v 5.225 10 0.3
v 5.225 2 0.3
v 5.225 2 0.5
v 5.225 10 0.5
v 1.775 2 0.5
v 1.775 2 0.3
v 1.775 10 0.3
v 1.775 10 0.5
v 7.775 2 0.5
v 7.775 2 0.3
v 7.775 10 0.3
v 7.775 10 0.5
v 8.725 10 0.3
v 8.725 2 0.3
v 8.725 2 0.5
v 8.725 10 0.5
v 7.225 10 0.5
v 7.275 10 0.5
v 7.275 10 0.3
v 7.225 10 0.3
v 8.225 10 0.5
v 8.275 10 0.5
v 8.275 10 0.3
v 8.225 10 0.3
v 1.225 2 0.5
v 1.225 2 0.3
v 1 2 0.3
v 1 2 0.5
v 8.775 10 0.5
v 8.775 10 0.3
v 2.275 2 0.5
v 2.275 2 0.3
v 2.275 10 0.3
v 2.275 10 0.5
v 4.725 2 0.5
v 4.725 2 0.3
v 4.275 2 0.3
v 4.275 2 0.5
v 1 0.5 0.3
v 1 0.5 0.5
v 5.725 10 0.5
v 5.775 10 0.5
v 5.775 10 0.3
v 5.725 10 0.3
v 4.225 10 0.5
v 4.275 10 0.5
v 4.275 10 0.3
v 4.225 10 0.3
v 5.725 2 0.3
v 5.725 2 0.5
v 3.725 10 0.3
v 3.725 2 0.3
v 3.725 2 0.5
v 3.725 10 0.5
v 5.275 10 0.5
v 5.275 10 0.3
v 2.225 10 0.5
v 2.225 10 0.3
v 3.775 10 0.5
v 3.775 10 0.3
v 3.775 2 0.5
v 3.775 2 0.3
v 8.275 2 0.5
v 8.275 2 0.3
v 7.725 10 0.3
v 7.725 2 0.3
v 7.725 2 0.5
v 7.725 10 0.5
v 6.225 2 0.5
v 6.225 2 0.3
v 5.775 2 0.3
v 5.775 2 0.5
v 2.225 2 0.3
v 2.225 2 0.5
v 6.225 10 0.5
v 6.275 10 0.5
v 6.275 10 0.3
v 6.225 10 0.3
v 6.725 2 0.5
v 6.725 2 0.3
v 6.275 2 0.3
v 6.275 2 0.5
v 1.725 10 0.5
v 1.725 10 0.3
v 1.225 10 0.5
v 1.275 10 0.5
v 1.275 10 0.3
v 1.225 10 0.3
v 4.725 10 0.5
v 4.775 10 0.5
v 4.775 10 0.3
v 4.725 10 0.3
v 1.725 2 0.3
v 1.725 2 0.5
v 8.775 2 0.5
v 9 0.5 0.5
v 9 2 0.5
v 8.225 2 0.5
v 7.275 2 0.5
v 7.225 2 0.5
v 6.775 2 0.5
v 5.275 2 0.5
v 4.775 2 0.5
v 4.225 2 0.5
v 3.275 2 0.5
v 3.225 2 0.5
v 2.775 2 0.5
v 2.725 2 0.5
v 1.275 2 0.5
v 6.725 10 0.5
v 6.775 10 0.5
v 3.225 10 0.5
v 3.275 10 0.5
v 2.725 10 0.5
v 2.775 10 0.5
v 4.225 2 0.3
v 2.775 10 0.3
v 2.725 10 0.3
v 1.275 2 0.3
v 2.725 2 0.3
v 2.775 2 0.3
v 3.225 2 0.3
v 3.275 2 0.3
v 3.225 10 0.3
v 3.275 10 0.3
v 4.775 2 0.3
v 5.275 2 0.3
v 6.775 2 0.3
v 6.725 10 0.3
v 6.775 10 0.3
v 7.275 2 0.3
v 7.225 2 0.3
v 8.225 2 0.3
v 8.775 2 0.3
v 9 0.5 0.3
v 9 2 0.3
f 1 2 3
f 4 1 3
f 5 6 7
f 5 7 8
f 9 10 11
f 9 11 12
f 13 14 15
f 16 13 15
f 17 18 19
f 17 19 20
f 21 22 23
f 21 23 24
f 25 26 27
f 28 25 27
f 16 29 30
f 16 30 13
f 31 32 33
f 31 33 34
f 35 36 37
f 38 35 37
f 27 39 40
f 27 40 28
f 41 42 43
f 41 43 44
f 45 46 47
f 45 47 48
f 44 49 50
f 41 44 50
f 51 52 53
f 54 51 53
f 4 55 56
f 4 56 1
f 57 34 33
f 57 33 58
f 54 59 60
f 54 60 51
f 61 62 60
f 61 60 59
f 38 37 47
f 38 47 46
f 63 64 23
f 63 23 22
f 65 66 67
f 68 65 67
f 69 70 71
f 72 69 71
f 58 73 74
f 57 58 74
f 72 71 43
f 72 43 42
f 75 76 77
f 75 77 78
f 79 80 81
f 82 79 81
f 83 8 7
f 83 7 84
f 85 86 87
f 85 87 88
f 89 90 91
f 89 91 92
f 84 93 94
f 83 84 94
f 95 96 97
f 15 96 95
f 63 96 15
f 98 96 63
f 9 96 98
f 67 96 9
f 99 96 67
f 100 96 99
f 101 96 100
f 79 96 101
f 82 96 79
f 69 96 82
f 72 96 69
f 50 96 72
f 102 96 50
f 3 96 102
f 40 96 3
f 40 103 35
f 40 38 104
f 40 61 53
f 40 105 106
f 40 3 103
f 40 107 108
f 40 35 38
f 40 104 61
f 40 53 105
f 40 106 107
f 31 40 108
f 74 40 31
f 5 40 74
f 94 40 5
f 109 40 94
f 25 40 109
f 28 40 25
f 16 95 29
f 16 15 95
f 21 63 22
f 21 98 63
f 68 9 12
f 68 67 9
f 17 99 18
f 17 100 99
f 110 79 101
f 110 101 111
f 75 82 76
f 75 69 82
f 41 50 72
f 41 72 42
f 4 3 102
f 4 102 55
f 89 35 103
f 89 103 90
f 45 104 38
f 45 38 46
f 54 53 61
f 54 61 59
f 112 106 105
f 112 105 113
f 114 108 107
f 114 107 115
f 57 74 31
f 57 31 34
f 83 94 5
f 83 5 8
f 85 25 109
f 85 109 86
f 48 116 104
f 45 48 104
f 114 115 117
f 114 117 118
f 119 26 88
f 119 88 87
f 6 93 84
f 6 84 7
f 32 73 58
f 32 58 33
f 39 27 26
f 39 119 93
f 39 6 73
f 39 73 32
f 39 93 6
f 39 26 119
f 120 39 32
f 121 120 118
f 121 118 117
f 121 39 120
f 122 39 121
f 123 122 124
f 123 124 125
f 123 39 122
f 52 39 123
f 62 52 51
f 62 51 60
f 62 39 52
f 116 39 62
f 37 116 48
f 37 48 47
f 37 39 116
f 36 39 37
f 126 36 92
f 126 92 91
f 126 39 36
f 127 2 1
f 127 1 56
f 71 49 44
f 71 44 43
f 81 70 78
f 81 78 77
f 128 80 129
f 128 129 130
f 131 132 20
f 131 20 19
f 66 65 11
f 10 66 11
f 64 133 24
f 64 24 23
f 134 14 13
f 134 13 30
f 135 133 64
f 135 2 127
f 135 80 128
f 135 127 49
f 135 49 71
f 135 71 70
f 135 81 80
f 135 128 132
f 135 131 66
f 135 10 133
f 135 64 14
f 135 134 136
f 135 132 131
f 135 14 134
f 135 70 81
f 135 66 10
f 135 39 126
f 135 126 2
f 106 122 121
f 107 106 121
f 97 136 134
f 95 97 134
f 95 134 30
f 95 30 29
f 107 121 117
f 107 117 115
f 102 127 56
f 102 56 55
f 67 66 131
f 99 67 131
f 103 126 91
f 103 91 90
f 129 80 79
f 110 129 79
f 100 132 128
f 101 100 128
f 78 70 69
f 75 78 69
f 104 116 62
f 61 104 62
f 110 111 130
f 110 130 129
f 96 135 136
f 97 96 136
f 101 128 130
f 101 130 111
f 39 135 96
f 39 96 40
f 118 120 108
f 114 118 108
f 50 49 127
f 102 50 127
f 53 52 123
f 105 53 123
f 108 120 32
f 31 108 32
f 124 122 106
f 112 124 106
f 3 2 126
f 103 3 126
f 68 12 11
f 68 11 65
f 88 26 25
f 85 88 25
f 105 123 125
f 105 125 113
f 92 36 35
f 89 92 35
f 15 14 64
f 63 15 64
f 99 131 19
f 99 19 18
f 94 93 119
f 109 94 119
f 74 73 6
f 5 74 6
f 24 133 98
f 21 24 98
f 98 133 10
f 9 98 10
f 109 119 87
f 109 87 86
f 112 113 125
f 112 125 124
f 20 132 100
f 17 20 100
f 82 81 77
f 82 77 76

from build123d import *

# Parameters (mm, degrees)
SKETCH1_W           = 1.5
SKETCH1_H           = 8
BOSS_EXTRUDE1_DEPTH = 0.5
SKETCH2_W           = 0.05
SKETCH2_H           = 0.5
BOSS_EXTRUDE2_DEPTH = 8
SKETCH3_W           = 8
SKETCH3_H           = 0.3
CUT_EXTRUDE1_DEPTH  = 14.095800854


with BuildPart() as part:
    # Sketch1 → Boss-Extrude1 (new body)
    with BuildSketch(Plane(origin=(0, 0, 0), x_dir=(0, 1, 0), z_dir=(0, 0, 1))):
        with Locations((1.25, -5)):
            Rectangle(SKETCH1_W, SKETCH1_H)
    extrude(amount=BOSS_EXTRUDE1_DEPTH)

    # Sketch2 → Boss-Extrude2 (add)
    with BuildSketch(Plane(origin=(0, 2, 0), x_dir=(-1, 0, 0), z_dir=(0, 1, 0))):
        with Locations((-8.75, 0.25)):
            Rectangle(SKETCH2_W, SKETCH2_H)
        with Locations((-8.25, 0.25)):
            Rectangle(SKETCH2_W, SKETCH2_H)
        with Locations((-7.75, 0.25)):
            Rectangle(SKETCH2_W, SKETCH2_H)
        with Locations((-7.25, 0.25)):
            Rectangle(SKETCH2_W, SKETCH2_H)
        with Locations((-6.75, 0.25)):
            Rectangle(SKETCH2_W, SKETCH2_H)
        with Locations((-6.25, 0.25)):
            Rectangle(SKETCH2_W, SKETCH2_H)
        with Locations((-5.75, 0.25)):
            Rectangle(SKETCH2_W, SKETCH2_H)
        with Locations((-5.25, 0.25)):
            Rectangle(SKETCH2_W, SKETCH2_H)
        with Locations((-4.75, 0.25)):
            Rectangle(SKETCH2_W, SKETCH2_H)
        with Locations((-4.25, 0.25)):
            Rectangle(SKETCH2_W, SKETCH2_H)
        with Locations((-3.75, 0.25)):
            Rectangle(SKETCH2_W, SKETCH2_H)
        with Locations((-3.25, 0.25)):
            Rectangle(SKETCH2_W, SKETCH2_H)
        with Locations((-2.75, 0.25)):
            Rectangle(SKETCH2_W, SKETCH2_H)
        with Locations((-2.25, 0.25)):
            Rectangle(SKETCH2_W, SKETCH2_H)
        with Locations((-1.75, 0.25)):
            Rectangle(SKETCH2_W, SKETCH2_H)
        with Locations((-1.25, 0.25)):
            Rectangle(SKETCH2_W, SKETCH2_H)
    extrude(amount=BOSS_EXTRUDE2_DEPTH)

    # Sketch3 → Cut-Extrude1 (cut, through all)
    with BuildSketch(Plane.XZ.offset(-0.5)):
        with Locations((5, 0.15)):
            Rectangle(SKETCH3_W, SKETCH3_H)
    extrude(amount=-CUT_EXTRUDE1_DEPTH, mode=Mode.SUBTRACT)


solid = part.part
